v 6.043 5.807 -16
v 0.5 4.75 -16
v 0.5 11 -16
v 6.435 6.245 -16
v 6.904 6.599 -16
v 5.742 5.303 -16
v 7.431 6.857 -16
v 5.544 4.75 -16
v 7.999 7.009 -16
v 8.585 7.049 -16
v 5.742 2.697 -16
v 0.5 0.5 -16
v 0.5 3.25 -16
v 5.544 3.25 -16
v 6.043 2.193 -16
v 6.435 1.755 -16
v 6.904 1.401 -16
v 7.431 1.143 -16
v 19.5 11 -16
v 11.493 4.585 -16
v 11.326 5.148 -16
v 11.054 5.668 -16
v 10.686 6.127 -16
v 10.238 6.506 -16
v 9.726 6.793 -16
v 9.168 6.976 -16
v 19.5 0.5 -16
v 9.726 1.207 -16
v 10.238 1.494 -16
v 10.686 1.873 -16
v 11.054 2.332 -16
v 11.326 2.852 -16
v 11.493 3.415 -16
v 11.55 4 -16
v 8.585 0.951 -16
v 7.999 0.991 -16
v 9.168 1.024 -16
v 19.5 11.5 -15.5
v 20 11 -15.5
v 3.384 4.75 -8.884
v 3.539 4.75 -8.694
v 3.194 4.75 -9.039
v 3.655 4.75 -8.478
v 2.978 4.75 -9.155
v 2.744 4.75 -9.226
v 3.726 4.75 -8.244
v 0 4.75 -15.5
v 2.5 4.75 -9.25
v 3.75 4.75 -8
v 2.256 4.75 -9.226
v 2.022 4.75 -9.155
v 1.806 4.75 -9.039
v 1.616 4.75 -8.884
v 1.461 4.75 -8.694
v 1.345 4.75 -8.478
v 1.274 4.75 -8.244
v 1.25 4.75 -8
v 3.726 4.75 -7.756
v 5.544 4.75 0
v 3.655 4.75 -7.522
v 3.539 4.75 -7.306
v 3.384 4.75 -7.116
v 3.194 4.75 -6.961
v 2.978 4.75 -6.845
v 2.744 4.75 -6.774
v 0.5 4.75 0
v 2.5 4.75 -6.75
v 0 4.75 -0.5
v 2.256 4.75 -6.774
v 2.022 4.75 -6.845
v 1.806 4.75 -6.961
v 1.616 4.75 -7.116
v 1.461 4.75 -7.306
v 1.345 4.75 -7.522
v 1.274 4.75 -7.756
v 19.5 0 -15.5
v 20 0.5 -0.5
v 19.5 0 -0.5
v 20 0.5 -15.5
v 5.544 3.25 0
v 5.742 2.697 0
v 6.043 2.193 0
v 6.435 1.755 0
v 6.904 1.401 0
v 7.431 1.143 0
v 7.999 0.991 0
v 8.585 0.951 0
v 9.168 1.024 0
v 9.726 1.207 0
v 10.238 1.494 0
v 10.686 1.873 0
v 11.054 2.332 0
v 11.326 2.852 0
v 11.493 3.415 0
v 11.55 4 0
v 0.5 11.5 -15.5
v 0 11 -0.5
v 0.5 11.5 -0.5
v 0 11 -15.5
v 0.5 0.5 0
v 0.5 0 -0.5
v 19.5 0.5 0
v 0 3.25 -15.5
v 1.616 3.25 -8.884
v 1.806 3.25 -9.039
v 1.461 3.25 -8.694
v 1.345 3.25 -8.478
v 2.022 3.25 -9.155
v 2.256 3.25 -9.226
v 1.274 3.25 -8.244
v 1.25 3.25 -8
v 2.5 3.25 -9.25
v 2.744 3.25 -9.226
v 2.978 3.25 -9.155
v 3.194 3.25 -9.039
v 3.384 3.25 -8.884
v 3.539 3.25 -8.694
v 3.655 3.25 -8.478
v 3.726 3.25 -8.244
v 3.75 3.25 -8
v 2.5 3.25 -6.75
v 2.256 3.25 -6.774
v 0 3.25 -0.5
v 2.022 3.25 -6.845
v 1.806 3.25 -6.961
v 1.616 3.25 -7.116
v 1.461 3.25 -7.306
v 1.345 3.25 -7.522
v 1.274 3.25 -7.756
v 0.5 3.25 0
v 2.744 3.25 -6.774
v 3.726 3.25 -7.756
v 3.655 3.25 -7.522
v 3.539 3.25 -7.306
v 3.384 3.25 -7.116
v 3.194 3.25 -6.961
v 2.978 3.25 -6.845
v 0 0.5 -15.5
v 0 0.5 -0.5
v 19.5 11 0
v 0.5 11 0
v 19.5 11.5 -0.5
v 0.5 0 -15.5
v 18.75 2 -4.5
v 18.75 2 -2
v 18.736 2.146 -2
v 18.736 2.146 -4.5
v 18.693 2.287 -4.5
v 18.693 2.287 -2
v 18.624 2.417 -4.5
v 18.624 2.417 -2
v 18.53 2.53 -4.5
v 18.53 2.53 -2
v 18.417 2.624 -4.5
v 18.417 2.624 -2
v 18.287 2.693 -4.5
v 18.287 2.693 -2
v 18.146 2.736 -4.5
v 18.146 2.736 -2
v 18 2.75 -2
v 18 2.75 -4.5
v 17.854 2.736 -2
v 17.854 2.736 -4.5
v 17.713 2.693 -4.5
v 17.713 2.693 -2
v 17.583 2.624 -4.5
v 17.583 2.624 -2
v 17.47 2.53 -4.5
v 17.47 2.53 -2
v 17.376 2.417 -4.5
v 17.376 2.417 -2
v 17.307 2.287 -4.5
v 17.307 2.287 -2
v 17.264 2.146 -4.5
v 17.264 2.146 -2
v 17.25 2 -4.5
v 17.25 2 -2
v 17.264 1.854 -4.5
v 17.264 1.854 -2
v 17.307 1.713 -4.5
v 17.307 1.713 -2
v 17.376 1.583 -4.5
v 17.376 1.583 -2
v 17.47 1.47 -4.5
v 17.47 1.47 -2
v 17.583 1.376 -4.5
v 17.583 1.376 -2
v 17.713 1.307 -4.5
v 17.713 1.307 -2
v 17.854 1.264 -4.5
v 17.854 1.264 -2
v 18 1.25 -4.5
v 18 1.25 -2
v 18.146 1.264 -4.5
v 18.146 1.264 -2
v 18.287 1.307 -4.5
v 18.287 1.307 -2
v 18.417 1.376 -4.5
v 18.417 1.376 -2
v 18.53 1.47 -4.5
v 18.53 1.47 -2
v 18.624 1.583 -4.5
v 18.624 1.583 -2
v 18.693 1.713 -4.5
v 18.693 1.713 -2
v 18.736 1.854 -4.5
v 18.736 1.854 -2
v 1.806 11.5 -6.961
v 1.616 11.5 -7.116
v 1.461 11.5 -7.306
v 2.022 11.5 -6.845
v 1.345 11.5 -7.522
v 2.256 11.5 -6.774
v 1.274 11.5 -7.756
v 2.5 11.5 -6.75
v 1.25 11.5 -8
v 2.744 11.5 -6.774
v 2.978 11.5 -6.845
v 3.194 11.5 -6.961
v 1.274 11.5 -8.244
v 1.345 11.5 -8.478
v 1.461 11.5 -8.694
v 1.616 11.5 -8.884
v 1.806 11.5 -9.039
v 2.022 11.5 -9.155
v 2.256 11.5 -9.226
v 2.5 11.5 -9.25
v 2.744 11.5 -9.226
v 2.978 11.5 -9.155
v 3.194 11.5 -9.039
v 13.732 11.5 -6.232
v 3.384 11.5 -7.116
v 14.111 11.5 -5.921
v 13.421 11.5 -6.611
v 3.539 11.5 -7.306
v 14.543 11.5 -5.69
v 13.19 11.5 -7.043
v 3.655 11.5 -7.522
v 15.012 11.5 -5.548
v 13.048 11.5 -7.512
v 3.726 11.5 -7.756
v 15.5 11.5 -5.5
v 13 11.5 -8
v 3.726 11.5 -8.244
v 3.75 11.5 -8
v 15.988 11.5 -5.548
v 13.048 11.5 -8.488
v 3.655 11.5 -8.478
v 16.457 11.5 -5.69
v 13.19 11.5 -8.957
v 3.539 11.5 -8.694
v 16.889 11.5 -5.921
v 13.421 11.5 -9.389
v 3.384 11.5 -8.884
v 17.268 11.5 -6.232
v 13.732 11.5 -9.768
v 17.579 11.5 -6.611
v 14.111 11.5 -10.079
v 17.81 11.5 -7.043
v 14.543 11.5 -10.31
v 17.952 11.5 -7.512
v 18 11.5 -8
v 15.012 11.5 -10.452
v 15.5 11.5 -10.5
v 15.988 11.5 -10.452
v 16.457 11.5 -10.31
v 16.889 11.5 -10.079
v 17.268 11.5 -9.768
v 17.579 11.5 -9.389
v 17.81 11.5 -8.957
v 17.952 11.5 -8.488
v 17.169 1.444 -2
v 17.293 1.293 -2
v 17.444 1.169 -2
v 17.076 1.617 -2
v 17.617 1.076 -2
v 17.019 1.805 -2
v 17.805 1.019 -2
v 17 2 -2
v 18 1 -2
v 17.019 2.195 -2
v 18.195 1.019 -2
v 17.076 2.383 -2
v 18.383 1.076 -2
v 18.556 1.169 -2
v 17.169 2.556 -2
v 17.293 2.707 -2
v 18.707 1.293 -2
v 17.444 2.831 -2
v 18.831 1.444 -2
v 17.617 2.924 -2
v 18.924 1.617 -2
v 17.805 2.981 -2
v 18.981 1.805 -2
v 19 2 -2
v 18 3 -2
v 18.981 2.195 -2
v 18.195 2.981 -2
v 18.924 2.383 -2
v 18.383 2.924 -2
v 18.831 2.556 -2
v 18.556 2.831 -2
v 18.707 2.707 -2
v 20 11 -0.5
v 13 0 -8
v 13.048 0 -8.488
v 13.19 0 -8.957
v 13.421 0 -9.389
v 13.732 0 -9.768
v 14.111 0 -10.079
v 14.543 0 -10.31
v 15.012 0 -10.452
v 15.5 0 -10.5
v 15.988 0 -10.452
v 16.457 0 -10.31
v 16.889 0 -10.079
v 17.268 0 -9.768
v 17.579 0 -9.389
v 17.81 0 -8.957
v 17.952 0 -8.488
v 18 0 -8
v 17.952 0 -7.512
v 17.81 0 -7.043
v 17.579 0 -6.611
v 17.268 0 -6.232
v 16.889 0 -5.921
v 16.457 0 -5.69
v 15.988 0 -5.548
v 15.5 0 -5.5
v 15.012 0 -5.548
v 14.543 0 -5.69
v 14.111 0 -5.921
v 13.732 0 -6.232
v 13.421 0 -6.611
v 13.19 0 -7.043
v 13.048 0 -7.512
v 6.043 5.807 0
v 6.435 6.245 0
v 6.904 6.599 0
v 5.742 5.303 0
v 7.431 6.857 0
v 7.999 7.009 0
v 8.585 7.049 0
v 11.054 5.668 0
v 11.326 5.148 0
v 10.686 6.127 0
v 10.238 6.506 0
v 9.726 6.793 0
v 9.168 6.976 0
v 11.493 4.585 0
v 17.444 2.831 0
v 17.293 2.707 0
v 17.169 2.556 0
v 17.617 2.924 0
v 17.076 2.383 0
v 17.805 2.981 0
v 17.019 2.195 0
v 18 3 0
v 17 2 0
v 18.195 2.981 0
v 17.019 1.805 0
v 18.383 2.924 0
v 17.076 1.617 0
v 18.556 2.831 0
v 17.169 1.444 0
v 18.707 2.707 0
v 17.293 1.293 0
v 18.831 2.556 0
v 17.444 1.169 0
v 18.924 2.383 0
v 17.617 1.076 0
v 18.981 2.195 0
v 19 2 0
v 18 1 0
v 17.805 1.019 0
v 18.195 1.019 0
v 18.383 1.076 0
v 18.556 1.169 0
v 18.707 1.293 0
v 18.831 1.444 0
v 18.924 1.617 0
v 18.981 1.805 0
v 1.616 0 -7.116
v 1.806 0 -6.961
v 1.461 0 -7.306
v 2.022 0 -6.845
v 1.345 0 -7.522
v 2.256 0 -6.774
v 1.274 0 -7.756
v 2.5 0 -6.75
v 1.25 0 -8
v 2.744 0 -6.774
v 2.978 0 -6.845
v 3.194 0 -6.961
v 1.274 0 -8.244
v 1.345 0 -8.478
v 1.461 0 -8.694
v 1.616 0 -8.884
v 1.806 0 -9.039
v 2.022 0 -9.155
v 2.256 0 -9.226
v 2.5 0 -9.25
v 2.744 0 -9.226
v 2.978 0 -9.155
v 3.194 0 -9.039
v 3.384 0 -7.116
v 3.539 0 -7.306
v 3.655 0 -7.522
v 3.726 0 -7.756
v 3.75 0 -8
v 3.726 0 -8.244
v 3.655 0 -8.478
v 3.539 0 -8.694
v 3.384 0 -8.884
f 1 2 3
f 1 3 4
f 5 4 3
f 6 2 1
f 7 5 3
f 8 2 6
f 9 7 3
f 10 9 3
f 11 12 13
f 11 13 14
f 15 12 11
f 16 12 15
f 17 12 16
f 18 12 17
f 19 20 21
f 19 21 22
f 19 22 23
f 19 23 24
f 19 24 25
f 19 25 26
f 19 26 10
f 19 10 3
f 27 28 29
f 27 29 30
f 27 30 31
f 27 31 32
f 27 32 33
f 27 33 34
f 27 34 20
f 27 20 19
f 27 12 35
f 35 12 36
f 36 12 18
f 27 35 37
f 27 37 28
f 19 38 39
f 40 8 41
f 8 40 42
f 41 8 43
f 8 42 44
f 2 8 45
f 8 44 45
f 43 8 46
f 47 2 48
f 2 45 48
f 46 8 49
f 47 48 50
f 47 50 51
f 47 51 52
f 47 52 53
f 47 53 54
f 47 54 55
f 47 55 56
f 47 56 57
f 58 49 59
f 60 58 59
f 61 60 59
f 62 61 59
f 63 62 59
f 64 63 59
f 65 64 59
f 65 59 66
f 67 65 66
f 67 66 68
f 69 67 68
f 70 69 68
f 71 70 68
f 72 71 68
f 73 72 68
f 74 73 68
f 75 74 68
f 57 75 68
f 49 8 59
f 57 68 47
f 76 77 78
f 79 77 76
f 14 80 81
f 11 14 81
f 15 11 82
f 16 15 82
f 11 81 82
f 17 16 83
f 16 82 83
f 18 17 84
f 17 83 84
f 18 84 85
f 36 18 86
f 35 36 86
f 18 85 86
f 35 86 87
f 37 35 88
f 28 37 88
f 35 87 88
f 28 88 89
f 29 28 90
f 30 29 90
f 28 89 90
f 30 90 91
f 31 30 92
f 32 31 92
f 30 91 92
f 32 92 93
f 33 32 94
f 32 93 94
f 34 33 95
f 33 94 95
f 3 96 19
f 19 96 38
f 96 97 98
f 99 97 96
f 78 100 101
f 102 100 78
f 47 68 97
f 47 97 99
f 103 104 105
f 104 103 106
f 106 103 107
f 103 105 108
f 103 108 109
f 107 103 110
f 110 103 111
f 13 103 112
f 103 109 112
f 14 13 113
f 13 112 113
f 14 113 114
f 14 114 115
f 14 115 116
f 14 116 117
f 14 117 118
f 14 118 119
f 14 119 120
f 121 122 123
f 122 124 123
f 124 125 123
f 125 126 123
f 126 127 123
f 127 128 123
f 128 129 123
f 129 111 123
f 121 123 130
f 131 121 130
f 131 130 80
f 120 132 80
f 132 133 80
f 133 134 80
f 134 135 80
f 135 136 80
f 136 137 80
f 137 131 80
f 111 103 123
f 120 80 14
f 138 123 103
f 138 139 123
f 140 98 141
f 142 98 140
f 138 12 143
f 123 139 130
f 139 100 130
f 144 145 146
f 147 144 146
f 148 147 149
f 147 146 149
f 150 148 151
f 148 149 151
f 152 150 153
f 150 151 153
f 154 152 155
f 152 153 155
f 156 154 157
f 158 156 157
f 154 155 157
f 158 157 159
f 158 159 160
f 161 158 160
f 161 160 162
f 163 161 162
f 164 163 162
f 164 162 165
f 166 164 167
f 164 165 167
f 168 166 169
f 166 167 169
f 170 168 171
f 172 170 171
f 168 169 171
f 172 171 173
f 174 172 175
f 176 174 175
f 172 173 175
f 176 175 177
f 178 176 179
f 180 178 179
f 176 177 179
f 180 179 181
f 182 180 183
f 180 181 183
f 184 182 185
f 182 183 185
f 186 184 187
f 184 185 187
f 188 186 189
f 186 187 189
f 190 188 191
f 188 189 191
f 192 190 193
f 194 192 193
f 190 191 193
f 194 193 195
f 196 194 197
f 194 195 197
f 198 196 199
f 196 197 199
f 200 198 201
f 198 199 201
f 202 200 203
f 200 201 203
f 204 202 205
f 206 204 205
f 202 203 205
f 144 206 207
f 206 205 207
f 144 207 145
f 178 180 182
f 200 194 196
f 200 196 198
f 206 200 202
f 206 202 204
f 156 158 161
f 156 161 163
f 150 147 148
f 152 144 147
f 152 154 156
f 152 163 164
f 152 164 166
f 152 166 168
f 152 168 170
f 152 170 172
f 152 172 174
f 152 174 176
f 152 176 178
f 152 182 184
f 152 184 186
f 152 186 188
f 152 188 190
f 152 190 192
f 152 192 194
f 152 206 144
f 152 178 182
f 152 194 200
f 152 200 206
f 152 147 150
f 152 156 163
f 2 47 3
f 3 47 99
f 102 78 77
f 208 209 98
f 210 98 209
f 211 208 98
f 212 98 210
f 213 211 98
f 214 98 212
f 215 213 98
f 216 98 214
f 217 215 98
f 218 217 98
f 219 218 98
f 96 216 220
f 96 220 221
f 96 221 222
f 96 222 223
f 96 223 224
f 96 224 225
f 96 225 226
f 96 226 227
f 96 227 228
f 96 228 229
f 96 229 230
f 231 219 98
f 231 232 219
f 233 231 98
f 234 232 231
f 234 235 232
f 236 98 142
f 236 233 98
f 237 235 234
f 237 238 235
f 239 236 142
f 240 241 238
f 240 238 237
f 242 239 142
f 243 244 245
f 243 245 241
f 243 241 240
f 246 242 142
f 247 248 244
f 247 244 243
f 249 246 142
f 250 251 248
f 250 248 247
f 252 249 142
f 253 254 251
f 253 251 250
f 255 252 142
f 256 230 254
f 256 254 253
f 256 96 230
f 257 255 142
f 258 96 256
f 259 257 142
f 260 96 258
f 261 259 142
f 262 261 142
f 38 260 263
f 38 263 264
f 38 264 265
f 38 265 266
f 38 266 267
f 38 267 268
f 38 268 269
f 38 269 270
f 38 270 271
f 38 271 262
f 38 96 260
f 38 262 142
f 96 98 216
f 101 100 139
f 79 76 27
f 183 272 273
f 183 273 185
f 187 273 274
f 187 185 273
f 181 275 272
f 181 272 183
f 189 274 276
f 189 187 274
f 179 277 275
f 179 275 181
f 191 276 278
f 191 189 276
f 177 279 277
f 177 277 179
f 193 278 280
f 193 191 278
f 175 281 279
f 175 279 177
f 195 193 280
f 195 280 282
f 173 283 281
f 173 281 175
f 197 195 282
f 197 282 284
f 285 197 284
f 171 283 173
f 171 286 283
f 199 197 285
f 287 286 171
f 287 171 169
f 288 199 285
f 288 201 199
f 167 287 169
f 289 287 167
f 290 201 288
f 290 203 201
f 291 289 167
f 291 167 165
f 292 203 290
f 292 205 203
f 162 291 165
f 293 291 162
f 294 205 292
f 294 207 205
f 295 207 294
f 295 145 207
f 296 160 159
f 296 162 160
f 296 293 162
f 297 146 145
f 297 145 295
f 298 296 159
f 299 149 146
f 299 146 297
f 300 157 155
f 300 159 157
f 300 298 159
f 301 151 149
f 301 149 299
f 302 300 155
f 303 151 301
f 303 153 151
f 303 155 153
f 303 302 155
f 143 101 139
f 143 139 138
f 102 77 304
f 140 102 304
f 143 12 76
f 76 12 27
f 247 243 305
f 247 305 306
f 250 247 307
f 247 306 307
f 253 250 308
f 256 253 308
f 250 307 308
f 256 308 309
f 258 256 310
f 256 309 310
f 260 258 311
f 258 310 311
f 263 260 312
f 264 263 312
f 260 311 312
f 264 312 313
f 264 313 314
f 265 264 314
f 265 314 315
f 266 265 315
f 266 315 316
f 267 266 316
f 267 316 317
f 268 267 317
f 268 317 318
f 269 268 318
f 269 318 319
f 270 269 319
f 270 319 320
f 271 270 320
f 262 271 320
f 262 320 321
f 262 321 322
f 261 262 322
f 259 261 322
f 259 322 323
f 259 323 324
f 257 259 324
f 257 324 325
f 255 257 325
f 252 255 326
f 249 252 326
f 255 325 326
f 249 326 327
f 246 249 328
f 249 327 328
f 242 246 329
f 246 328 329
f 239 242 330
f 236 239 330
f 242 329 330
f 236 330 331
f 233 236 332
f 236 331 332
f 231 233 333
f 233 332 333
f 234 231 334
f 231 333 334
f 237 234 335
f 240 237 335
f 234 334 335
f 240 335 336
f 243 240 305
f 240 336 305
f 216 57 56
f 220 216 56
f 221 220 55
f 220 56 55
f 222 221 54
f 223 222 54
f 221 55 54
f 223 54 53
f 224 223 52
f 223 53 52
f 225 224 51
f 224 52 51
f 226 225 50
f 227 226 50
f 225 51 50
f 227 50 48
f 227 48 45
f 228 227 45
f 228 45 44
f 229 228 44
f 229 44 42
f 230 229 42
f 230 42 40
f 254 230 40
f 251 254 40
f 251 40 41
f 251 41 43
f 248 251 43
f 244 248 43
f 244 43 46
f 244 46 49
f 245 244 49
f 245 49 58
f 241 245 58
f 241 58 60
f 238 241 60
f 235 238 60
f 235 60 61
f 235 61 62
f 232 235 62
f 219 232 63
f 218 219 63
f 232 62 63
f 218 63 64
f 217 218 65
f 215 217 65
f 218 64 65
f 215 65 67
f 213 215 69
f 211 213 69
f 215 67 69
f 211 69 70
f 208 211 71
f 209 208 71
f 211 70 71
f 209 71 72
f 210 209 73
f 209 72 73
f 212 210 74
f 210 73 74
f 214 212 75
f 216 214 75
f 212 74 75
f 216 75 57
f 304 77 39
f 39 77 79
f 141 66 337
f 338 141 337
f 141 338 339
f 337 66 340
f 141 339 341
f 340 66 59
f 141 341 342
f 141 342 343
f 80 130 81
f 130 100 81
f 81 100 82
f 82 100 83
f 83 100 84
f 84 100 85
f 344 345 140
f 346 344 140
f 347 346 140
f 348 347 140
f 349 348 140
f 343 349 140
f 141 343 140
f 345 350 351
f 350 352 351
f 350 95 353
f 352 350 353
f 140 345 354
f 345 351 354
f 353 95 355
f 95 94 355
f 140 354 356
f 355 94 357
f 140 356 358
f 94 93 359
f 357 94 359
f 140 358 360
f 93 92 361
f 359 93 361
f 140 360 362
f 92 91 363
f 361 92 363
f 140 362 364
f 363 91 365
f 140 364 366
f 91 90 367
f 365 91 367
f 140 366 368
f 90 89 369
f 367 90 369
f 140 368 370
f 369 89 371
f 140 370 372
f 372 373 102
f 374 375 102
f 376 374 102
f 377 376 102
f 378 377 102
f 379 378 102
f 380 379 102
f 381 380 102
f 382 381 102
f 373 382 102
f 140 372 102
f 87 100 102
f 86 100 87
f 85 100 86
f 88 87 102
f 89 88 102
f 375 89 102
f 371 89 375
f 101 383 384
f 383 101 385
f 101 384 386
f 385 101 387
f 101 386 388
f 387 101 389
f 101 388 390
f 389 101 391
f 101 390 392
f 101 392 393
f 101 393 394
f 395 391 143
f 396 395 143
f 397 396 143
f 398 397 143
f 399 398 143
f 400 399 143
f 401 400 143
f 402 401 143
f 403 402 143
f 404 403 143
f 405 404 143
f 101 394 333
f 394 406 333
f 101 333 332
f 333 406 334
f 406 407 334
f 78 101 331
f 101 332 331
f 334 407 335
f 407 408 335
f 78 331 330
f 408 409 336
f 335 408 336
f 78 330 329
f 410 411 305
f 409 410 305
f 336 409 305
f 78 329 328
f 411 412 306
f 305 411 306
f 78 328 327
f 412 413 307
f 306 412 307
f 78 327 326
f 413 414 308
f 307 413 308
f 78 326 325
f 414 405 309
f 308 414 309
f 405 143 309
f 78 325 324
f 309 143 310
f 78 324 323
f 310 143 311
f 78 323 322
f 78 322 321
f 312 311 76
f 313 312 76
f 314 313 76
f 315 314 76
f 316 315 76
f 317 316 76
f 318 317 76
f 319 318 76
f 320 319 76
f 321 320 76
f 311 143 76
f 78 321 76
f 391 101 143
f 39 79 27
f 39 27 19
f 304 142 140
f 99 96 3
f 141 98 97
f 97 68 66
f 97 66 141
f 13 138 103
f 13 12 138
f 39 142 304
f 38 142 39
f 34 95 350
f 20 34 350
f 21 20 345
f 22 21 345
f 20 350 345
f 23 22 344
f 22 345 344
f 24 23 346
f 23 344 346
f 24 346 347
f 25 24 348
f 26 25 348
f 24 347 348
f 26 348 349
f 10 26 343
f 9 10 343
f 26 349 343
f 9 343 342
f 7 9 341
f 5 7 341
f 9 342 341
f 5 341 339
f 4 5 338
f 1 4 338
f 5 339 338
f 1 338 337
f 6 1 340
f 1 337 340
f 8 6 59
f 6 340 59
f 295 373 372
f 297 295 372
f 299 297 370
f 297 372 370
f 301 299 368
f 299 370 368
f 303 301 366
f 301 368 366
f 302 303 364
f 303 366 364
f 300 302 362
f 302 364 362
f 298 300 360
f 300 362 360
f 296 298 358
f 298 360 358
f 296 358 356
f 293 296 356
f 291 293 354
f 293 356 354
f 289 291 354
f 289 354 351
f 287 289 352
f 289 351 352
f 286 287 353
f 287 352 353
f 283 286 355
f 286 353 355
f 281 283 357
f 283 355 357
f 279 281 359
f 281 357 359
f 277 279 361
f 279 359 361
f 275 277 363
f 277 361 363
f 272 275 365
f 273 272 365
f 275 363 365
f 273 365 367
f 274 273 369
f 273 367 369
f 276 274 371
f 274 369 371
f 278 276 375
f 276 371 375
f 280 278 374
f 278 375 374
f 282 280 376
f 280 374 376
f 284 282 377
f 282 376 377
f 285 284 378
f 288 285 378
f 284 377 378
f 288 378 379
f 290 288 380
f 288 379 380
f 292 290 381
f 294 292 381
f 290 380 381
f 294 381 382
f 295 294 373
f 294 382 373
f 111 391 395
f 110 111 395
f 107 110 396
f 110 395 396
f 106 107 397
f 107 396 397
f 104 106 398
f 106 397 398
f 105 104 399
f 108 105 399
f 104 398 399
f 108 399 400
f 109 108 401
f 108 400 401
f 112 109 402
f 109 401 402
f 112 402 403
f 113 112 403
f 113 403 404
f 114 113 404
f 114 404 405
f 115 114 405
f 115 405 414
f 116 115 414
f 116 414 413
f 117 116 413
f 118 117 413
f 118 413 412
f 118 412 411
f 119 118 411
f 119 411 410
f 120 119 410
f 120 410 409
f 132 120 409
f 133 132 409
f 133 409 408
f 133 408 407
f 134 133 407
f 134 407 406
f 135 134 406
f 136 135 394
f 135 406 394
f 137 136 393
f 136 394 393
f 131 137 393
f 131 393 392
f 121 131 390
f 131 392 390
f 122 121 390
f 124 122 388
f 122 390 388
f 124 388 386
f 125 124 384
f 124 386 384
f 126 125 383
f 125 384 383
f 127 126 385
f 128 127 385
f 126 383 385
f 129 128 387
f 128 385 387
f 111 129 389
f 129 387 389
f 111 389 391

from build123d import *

# Parameters (mm, degrees)
SKETCH1_W             = 20
SKETCH1_H             = 16
BOSS_EXTRUDE1_DEPTH   = 11.5
M3X0_5_TAPPED_HOLE1_D = 2.5
M6_TAPPED_HOLE1_D     = 5
CUT_EXTRUDE1_DEPTH    = 16
SKETCH10_R            = 1
CUT_EXTRUDE2_DEPTH    = 2
SKETCH11_R            = 0.75
CUT_EXTRUDE3_DEPTH    = 2.5
CHAMFER1_SIZE         = 0.5


with BuildPart() as part:
    # Sketch1 → Boss-Extrude1 (new body)
    with BuildSketch(Plane(origin=(0, 0, 0), x_dir=(1, 0, 0), z_dir=(0, 1, 0))):
        with Locations((10, 8)):
            Rectangle(SKETCH1_W, SKETCH1_H)
    extrude(amount=BOSS_EXTRUDE1_DEPTH)

    # M3x0.5 Tapped Hole1 (through all)
    with Locations(Plane(origin=(0, 11.5, 0), x_dir=(1, 0, 0), z_dir=(0, 1, 0))):
        with Locations((2.5, 8)):
            Hole(M3X0_5_TAPPED_HOLE1_D / 2)

    # M6 Tapped Hole1 (through all)
    with Locations(Plane(origin=(0, 11.5, 0), x_dir=(1, 0, 0), z_dir=(0, 1, 0))):
        with Locations((15.5, 8)):
            Hole(M6_TAPPED_HOLE1_D / 2)

    # Sketch2 → Cut-Extrude1 (cut)
    with BuildSketch(Plane.XY):
        with BuildLine():
            Line((5.5436509, 4.75), (0, 4.75))
            Line((0, 4.75), (0, 3.25))
            Line((0, 3.25), (5.5436509, 3.25))
            ThreePointArc((5.5436509, 3.25), (5.45, 4), (5.5436509, 4.75))
        make_face()
        with BuildLine():
            ThreePointArc((11.55, 4), (8.877912189, 7.026496717), (5.5436509, 4.75))
            Line((5.5436509, 4.75), (5.5436509, 3.25))
            ThreePointArc((5.5436509, 3.25), (8.877912189, 0.973503283), (11.55, 4))
        make_face()
        with BuildLine():
            Line((5.5436509, 3.25), (5.5436509, 4.75))
            ThreePointArc((5.5436509, 4.75), (5.45, 4), (5.5436509, 3.25))
        make_face()
    extrude(amount=-CUT_EXTRUDE1_DEPTH, mode=Mode.SUBTRACT)

    # Sketch10 → Cut-Extrude2 (cut)
    with BuildSketch(Plane.XY):
        with Locations((18, 2)):
            Circle(SKETCH10_R)
    extrude(amount=-CUT_EXTRUDE2_DEPTH, mode=Mode.SUBTRACT)

    # Sketch11 → Cut-Extrude3 (cut)
    with BuildSketch(Plane.XY.offset(-2)):
        with Locations((18, 2)):
            Circle(SKETCH11_R)
    extrude(amount=-CUT_EXTRUDE3_DEPTH, mode=Mode.SUBTRACT)

    # Chamfer1
    chamfer1_edges = [part.edges().sort_by_distance(p)[0] for p in [
        (20, 11.5, -8),
        (10, 11.5, -16),
        (0, 1.625, -16),
        (0, 1.625, 0),
        (0, 11.5, -8),
        (10, 0, -16),
        (20, 0, -8),
        (10, 0, 0),
        (0, 0, -8),
        (10, 11.5, 0),
        (0, 8.125, -16),
        (20, 5.75, -16),
        (20, 5.75, 0),
        (0, 8.125, 0),
    ]]
    chamfer(chamfer1_edges, length=CHAMFER1_SIZE)


solid = part.part
